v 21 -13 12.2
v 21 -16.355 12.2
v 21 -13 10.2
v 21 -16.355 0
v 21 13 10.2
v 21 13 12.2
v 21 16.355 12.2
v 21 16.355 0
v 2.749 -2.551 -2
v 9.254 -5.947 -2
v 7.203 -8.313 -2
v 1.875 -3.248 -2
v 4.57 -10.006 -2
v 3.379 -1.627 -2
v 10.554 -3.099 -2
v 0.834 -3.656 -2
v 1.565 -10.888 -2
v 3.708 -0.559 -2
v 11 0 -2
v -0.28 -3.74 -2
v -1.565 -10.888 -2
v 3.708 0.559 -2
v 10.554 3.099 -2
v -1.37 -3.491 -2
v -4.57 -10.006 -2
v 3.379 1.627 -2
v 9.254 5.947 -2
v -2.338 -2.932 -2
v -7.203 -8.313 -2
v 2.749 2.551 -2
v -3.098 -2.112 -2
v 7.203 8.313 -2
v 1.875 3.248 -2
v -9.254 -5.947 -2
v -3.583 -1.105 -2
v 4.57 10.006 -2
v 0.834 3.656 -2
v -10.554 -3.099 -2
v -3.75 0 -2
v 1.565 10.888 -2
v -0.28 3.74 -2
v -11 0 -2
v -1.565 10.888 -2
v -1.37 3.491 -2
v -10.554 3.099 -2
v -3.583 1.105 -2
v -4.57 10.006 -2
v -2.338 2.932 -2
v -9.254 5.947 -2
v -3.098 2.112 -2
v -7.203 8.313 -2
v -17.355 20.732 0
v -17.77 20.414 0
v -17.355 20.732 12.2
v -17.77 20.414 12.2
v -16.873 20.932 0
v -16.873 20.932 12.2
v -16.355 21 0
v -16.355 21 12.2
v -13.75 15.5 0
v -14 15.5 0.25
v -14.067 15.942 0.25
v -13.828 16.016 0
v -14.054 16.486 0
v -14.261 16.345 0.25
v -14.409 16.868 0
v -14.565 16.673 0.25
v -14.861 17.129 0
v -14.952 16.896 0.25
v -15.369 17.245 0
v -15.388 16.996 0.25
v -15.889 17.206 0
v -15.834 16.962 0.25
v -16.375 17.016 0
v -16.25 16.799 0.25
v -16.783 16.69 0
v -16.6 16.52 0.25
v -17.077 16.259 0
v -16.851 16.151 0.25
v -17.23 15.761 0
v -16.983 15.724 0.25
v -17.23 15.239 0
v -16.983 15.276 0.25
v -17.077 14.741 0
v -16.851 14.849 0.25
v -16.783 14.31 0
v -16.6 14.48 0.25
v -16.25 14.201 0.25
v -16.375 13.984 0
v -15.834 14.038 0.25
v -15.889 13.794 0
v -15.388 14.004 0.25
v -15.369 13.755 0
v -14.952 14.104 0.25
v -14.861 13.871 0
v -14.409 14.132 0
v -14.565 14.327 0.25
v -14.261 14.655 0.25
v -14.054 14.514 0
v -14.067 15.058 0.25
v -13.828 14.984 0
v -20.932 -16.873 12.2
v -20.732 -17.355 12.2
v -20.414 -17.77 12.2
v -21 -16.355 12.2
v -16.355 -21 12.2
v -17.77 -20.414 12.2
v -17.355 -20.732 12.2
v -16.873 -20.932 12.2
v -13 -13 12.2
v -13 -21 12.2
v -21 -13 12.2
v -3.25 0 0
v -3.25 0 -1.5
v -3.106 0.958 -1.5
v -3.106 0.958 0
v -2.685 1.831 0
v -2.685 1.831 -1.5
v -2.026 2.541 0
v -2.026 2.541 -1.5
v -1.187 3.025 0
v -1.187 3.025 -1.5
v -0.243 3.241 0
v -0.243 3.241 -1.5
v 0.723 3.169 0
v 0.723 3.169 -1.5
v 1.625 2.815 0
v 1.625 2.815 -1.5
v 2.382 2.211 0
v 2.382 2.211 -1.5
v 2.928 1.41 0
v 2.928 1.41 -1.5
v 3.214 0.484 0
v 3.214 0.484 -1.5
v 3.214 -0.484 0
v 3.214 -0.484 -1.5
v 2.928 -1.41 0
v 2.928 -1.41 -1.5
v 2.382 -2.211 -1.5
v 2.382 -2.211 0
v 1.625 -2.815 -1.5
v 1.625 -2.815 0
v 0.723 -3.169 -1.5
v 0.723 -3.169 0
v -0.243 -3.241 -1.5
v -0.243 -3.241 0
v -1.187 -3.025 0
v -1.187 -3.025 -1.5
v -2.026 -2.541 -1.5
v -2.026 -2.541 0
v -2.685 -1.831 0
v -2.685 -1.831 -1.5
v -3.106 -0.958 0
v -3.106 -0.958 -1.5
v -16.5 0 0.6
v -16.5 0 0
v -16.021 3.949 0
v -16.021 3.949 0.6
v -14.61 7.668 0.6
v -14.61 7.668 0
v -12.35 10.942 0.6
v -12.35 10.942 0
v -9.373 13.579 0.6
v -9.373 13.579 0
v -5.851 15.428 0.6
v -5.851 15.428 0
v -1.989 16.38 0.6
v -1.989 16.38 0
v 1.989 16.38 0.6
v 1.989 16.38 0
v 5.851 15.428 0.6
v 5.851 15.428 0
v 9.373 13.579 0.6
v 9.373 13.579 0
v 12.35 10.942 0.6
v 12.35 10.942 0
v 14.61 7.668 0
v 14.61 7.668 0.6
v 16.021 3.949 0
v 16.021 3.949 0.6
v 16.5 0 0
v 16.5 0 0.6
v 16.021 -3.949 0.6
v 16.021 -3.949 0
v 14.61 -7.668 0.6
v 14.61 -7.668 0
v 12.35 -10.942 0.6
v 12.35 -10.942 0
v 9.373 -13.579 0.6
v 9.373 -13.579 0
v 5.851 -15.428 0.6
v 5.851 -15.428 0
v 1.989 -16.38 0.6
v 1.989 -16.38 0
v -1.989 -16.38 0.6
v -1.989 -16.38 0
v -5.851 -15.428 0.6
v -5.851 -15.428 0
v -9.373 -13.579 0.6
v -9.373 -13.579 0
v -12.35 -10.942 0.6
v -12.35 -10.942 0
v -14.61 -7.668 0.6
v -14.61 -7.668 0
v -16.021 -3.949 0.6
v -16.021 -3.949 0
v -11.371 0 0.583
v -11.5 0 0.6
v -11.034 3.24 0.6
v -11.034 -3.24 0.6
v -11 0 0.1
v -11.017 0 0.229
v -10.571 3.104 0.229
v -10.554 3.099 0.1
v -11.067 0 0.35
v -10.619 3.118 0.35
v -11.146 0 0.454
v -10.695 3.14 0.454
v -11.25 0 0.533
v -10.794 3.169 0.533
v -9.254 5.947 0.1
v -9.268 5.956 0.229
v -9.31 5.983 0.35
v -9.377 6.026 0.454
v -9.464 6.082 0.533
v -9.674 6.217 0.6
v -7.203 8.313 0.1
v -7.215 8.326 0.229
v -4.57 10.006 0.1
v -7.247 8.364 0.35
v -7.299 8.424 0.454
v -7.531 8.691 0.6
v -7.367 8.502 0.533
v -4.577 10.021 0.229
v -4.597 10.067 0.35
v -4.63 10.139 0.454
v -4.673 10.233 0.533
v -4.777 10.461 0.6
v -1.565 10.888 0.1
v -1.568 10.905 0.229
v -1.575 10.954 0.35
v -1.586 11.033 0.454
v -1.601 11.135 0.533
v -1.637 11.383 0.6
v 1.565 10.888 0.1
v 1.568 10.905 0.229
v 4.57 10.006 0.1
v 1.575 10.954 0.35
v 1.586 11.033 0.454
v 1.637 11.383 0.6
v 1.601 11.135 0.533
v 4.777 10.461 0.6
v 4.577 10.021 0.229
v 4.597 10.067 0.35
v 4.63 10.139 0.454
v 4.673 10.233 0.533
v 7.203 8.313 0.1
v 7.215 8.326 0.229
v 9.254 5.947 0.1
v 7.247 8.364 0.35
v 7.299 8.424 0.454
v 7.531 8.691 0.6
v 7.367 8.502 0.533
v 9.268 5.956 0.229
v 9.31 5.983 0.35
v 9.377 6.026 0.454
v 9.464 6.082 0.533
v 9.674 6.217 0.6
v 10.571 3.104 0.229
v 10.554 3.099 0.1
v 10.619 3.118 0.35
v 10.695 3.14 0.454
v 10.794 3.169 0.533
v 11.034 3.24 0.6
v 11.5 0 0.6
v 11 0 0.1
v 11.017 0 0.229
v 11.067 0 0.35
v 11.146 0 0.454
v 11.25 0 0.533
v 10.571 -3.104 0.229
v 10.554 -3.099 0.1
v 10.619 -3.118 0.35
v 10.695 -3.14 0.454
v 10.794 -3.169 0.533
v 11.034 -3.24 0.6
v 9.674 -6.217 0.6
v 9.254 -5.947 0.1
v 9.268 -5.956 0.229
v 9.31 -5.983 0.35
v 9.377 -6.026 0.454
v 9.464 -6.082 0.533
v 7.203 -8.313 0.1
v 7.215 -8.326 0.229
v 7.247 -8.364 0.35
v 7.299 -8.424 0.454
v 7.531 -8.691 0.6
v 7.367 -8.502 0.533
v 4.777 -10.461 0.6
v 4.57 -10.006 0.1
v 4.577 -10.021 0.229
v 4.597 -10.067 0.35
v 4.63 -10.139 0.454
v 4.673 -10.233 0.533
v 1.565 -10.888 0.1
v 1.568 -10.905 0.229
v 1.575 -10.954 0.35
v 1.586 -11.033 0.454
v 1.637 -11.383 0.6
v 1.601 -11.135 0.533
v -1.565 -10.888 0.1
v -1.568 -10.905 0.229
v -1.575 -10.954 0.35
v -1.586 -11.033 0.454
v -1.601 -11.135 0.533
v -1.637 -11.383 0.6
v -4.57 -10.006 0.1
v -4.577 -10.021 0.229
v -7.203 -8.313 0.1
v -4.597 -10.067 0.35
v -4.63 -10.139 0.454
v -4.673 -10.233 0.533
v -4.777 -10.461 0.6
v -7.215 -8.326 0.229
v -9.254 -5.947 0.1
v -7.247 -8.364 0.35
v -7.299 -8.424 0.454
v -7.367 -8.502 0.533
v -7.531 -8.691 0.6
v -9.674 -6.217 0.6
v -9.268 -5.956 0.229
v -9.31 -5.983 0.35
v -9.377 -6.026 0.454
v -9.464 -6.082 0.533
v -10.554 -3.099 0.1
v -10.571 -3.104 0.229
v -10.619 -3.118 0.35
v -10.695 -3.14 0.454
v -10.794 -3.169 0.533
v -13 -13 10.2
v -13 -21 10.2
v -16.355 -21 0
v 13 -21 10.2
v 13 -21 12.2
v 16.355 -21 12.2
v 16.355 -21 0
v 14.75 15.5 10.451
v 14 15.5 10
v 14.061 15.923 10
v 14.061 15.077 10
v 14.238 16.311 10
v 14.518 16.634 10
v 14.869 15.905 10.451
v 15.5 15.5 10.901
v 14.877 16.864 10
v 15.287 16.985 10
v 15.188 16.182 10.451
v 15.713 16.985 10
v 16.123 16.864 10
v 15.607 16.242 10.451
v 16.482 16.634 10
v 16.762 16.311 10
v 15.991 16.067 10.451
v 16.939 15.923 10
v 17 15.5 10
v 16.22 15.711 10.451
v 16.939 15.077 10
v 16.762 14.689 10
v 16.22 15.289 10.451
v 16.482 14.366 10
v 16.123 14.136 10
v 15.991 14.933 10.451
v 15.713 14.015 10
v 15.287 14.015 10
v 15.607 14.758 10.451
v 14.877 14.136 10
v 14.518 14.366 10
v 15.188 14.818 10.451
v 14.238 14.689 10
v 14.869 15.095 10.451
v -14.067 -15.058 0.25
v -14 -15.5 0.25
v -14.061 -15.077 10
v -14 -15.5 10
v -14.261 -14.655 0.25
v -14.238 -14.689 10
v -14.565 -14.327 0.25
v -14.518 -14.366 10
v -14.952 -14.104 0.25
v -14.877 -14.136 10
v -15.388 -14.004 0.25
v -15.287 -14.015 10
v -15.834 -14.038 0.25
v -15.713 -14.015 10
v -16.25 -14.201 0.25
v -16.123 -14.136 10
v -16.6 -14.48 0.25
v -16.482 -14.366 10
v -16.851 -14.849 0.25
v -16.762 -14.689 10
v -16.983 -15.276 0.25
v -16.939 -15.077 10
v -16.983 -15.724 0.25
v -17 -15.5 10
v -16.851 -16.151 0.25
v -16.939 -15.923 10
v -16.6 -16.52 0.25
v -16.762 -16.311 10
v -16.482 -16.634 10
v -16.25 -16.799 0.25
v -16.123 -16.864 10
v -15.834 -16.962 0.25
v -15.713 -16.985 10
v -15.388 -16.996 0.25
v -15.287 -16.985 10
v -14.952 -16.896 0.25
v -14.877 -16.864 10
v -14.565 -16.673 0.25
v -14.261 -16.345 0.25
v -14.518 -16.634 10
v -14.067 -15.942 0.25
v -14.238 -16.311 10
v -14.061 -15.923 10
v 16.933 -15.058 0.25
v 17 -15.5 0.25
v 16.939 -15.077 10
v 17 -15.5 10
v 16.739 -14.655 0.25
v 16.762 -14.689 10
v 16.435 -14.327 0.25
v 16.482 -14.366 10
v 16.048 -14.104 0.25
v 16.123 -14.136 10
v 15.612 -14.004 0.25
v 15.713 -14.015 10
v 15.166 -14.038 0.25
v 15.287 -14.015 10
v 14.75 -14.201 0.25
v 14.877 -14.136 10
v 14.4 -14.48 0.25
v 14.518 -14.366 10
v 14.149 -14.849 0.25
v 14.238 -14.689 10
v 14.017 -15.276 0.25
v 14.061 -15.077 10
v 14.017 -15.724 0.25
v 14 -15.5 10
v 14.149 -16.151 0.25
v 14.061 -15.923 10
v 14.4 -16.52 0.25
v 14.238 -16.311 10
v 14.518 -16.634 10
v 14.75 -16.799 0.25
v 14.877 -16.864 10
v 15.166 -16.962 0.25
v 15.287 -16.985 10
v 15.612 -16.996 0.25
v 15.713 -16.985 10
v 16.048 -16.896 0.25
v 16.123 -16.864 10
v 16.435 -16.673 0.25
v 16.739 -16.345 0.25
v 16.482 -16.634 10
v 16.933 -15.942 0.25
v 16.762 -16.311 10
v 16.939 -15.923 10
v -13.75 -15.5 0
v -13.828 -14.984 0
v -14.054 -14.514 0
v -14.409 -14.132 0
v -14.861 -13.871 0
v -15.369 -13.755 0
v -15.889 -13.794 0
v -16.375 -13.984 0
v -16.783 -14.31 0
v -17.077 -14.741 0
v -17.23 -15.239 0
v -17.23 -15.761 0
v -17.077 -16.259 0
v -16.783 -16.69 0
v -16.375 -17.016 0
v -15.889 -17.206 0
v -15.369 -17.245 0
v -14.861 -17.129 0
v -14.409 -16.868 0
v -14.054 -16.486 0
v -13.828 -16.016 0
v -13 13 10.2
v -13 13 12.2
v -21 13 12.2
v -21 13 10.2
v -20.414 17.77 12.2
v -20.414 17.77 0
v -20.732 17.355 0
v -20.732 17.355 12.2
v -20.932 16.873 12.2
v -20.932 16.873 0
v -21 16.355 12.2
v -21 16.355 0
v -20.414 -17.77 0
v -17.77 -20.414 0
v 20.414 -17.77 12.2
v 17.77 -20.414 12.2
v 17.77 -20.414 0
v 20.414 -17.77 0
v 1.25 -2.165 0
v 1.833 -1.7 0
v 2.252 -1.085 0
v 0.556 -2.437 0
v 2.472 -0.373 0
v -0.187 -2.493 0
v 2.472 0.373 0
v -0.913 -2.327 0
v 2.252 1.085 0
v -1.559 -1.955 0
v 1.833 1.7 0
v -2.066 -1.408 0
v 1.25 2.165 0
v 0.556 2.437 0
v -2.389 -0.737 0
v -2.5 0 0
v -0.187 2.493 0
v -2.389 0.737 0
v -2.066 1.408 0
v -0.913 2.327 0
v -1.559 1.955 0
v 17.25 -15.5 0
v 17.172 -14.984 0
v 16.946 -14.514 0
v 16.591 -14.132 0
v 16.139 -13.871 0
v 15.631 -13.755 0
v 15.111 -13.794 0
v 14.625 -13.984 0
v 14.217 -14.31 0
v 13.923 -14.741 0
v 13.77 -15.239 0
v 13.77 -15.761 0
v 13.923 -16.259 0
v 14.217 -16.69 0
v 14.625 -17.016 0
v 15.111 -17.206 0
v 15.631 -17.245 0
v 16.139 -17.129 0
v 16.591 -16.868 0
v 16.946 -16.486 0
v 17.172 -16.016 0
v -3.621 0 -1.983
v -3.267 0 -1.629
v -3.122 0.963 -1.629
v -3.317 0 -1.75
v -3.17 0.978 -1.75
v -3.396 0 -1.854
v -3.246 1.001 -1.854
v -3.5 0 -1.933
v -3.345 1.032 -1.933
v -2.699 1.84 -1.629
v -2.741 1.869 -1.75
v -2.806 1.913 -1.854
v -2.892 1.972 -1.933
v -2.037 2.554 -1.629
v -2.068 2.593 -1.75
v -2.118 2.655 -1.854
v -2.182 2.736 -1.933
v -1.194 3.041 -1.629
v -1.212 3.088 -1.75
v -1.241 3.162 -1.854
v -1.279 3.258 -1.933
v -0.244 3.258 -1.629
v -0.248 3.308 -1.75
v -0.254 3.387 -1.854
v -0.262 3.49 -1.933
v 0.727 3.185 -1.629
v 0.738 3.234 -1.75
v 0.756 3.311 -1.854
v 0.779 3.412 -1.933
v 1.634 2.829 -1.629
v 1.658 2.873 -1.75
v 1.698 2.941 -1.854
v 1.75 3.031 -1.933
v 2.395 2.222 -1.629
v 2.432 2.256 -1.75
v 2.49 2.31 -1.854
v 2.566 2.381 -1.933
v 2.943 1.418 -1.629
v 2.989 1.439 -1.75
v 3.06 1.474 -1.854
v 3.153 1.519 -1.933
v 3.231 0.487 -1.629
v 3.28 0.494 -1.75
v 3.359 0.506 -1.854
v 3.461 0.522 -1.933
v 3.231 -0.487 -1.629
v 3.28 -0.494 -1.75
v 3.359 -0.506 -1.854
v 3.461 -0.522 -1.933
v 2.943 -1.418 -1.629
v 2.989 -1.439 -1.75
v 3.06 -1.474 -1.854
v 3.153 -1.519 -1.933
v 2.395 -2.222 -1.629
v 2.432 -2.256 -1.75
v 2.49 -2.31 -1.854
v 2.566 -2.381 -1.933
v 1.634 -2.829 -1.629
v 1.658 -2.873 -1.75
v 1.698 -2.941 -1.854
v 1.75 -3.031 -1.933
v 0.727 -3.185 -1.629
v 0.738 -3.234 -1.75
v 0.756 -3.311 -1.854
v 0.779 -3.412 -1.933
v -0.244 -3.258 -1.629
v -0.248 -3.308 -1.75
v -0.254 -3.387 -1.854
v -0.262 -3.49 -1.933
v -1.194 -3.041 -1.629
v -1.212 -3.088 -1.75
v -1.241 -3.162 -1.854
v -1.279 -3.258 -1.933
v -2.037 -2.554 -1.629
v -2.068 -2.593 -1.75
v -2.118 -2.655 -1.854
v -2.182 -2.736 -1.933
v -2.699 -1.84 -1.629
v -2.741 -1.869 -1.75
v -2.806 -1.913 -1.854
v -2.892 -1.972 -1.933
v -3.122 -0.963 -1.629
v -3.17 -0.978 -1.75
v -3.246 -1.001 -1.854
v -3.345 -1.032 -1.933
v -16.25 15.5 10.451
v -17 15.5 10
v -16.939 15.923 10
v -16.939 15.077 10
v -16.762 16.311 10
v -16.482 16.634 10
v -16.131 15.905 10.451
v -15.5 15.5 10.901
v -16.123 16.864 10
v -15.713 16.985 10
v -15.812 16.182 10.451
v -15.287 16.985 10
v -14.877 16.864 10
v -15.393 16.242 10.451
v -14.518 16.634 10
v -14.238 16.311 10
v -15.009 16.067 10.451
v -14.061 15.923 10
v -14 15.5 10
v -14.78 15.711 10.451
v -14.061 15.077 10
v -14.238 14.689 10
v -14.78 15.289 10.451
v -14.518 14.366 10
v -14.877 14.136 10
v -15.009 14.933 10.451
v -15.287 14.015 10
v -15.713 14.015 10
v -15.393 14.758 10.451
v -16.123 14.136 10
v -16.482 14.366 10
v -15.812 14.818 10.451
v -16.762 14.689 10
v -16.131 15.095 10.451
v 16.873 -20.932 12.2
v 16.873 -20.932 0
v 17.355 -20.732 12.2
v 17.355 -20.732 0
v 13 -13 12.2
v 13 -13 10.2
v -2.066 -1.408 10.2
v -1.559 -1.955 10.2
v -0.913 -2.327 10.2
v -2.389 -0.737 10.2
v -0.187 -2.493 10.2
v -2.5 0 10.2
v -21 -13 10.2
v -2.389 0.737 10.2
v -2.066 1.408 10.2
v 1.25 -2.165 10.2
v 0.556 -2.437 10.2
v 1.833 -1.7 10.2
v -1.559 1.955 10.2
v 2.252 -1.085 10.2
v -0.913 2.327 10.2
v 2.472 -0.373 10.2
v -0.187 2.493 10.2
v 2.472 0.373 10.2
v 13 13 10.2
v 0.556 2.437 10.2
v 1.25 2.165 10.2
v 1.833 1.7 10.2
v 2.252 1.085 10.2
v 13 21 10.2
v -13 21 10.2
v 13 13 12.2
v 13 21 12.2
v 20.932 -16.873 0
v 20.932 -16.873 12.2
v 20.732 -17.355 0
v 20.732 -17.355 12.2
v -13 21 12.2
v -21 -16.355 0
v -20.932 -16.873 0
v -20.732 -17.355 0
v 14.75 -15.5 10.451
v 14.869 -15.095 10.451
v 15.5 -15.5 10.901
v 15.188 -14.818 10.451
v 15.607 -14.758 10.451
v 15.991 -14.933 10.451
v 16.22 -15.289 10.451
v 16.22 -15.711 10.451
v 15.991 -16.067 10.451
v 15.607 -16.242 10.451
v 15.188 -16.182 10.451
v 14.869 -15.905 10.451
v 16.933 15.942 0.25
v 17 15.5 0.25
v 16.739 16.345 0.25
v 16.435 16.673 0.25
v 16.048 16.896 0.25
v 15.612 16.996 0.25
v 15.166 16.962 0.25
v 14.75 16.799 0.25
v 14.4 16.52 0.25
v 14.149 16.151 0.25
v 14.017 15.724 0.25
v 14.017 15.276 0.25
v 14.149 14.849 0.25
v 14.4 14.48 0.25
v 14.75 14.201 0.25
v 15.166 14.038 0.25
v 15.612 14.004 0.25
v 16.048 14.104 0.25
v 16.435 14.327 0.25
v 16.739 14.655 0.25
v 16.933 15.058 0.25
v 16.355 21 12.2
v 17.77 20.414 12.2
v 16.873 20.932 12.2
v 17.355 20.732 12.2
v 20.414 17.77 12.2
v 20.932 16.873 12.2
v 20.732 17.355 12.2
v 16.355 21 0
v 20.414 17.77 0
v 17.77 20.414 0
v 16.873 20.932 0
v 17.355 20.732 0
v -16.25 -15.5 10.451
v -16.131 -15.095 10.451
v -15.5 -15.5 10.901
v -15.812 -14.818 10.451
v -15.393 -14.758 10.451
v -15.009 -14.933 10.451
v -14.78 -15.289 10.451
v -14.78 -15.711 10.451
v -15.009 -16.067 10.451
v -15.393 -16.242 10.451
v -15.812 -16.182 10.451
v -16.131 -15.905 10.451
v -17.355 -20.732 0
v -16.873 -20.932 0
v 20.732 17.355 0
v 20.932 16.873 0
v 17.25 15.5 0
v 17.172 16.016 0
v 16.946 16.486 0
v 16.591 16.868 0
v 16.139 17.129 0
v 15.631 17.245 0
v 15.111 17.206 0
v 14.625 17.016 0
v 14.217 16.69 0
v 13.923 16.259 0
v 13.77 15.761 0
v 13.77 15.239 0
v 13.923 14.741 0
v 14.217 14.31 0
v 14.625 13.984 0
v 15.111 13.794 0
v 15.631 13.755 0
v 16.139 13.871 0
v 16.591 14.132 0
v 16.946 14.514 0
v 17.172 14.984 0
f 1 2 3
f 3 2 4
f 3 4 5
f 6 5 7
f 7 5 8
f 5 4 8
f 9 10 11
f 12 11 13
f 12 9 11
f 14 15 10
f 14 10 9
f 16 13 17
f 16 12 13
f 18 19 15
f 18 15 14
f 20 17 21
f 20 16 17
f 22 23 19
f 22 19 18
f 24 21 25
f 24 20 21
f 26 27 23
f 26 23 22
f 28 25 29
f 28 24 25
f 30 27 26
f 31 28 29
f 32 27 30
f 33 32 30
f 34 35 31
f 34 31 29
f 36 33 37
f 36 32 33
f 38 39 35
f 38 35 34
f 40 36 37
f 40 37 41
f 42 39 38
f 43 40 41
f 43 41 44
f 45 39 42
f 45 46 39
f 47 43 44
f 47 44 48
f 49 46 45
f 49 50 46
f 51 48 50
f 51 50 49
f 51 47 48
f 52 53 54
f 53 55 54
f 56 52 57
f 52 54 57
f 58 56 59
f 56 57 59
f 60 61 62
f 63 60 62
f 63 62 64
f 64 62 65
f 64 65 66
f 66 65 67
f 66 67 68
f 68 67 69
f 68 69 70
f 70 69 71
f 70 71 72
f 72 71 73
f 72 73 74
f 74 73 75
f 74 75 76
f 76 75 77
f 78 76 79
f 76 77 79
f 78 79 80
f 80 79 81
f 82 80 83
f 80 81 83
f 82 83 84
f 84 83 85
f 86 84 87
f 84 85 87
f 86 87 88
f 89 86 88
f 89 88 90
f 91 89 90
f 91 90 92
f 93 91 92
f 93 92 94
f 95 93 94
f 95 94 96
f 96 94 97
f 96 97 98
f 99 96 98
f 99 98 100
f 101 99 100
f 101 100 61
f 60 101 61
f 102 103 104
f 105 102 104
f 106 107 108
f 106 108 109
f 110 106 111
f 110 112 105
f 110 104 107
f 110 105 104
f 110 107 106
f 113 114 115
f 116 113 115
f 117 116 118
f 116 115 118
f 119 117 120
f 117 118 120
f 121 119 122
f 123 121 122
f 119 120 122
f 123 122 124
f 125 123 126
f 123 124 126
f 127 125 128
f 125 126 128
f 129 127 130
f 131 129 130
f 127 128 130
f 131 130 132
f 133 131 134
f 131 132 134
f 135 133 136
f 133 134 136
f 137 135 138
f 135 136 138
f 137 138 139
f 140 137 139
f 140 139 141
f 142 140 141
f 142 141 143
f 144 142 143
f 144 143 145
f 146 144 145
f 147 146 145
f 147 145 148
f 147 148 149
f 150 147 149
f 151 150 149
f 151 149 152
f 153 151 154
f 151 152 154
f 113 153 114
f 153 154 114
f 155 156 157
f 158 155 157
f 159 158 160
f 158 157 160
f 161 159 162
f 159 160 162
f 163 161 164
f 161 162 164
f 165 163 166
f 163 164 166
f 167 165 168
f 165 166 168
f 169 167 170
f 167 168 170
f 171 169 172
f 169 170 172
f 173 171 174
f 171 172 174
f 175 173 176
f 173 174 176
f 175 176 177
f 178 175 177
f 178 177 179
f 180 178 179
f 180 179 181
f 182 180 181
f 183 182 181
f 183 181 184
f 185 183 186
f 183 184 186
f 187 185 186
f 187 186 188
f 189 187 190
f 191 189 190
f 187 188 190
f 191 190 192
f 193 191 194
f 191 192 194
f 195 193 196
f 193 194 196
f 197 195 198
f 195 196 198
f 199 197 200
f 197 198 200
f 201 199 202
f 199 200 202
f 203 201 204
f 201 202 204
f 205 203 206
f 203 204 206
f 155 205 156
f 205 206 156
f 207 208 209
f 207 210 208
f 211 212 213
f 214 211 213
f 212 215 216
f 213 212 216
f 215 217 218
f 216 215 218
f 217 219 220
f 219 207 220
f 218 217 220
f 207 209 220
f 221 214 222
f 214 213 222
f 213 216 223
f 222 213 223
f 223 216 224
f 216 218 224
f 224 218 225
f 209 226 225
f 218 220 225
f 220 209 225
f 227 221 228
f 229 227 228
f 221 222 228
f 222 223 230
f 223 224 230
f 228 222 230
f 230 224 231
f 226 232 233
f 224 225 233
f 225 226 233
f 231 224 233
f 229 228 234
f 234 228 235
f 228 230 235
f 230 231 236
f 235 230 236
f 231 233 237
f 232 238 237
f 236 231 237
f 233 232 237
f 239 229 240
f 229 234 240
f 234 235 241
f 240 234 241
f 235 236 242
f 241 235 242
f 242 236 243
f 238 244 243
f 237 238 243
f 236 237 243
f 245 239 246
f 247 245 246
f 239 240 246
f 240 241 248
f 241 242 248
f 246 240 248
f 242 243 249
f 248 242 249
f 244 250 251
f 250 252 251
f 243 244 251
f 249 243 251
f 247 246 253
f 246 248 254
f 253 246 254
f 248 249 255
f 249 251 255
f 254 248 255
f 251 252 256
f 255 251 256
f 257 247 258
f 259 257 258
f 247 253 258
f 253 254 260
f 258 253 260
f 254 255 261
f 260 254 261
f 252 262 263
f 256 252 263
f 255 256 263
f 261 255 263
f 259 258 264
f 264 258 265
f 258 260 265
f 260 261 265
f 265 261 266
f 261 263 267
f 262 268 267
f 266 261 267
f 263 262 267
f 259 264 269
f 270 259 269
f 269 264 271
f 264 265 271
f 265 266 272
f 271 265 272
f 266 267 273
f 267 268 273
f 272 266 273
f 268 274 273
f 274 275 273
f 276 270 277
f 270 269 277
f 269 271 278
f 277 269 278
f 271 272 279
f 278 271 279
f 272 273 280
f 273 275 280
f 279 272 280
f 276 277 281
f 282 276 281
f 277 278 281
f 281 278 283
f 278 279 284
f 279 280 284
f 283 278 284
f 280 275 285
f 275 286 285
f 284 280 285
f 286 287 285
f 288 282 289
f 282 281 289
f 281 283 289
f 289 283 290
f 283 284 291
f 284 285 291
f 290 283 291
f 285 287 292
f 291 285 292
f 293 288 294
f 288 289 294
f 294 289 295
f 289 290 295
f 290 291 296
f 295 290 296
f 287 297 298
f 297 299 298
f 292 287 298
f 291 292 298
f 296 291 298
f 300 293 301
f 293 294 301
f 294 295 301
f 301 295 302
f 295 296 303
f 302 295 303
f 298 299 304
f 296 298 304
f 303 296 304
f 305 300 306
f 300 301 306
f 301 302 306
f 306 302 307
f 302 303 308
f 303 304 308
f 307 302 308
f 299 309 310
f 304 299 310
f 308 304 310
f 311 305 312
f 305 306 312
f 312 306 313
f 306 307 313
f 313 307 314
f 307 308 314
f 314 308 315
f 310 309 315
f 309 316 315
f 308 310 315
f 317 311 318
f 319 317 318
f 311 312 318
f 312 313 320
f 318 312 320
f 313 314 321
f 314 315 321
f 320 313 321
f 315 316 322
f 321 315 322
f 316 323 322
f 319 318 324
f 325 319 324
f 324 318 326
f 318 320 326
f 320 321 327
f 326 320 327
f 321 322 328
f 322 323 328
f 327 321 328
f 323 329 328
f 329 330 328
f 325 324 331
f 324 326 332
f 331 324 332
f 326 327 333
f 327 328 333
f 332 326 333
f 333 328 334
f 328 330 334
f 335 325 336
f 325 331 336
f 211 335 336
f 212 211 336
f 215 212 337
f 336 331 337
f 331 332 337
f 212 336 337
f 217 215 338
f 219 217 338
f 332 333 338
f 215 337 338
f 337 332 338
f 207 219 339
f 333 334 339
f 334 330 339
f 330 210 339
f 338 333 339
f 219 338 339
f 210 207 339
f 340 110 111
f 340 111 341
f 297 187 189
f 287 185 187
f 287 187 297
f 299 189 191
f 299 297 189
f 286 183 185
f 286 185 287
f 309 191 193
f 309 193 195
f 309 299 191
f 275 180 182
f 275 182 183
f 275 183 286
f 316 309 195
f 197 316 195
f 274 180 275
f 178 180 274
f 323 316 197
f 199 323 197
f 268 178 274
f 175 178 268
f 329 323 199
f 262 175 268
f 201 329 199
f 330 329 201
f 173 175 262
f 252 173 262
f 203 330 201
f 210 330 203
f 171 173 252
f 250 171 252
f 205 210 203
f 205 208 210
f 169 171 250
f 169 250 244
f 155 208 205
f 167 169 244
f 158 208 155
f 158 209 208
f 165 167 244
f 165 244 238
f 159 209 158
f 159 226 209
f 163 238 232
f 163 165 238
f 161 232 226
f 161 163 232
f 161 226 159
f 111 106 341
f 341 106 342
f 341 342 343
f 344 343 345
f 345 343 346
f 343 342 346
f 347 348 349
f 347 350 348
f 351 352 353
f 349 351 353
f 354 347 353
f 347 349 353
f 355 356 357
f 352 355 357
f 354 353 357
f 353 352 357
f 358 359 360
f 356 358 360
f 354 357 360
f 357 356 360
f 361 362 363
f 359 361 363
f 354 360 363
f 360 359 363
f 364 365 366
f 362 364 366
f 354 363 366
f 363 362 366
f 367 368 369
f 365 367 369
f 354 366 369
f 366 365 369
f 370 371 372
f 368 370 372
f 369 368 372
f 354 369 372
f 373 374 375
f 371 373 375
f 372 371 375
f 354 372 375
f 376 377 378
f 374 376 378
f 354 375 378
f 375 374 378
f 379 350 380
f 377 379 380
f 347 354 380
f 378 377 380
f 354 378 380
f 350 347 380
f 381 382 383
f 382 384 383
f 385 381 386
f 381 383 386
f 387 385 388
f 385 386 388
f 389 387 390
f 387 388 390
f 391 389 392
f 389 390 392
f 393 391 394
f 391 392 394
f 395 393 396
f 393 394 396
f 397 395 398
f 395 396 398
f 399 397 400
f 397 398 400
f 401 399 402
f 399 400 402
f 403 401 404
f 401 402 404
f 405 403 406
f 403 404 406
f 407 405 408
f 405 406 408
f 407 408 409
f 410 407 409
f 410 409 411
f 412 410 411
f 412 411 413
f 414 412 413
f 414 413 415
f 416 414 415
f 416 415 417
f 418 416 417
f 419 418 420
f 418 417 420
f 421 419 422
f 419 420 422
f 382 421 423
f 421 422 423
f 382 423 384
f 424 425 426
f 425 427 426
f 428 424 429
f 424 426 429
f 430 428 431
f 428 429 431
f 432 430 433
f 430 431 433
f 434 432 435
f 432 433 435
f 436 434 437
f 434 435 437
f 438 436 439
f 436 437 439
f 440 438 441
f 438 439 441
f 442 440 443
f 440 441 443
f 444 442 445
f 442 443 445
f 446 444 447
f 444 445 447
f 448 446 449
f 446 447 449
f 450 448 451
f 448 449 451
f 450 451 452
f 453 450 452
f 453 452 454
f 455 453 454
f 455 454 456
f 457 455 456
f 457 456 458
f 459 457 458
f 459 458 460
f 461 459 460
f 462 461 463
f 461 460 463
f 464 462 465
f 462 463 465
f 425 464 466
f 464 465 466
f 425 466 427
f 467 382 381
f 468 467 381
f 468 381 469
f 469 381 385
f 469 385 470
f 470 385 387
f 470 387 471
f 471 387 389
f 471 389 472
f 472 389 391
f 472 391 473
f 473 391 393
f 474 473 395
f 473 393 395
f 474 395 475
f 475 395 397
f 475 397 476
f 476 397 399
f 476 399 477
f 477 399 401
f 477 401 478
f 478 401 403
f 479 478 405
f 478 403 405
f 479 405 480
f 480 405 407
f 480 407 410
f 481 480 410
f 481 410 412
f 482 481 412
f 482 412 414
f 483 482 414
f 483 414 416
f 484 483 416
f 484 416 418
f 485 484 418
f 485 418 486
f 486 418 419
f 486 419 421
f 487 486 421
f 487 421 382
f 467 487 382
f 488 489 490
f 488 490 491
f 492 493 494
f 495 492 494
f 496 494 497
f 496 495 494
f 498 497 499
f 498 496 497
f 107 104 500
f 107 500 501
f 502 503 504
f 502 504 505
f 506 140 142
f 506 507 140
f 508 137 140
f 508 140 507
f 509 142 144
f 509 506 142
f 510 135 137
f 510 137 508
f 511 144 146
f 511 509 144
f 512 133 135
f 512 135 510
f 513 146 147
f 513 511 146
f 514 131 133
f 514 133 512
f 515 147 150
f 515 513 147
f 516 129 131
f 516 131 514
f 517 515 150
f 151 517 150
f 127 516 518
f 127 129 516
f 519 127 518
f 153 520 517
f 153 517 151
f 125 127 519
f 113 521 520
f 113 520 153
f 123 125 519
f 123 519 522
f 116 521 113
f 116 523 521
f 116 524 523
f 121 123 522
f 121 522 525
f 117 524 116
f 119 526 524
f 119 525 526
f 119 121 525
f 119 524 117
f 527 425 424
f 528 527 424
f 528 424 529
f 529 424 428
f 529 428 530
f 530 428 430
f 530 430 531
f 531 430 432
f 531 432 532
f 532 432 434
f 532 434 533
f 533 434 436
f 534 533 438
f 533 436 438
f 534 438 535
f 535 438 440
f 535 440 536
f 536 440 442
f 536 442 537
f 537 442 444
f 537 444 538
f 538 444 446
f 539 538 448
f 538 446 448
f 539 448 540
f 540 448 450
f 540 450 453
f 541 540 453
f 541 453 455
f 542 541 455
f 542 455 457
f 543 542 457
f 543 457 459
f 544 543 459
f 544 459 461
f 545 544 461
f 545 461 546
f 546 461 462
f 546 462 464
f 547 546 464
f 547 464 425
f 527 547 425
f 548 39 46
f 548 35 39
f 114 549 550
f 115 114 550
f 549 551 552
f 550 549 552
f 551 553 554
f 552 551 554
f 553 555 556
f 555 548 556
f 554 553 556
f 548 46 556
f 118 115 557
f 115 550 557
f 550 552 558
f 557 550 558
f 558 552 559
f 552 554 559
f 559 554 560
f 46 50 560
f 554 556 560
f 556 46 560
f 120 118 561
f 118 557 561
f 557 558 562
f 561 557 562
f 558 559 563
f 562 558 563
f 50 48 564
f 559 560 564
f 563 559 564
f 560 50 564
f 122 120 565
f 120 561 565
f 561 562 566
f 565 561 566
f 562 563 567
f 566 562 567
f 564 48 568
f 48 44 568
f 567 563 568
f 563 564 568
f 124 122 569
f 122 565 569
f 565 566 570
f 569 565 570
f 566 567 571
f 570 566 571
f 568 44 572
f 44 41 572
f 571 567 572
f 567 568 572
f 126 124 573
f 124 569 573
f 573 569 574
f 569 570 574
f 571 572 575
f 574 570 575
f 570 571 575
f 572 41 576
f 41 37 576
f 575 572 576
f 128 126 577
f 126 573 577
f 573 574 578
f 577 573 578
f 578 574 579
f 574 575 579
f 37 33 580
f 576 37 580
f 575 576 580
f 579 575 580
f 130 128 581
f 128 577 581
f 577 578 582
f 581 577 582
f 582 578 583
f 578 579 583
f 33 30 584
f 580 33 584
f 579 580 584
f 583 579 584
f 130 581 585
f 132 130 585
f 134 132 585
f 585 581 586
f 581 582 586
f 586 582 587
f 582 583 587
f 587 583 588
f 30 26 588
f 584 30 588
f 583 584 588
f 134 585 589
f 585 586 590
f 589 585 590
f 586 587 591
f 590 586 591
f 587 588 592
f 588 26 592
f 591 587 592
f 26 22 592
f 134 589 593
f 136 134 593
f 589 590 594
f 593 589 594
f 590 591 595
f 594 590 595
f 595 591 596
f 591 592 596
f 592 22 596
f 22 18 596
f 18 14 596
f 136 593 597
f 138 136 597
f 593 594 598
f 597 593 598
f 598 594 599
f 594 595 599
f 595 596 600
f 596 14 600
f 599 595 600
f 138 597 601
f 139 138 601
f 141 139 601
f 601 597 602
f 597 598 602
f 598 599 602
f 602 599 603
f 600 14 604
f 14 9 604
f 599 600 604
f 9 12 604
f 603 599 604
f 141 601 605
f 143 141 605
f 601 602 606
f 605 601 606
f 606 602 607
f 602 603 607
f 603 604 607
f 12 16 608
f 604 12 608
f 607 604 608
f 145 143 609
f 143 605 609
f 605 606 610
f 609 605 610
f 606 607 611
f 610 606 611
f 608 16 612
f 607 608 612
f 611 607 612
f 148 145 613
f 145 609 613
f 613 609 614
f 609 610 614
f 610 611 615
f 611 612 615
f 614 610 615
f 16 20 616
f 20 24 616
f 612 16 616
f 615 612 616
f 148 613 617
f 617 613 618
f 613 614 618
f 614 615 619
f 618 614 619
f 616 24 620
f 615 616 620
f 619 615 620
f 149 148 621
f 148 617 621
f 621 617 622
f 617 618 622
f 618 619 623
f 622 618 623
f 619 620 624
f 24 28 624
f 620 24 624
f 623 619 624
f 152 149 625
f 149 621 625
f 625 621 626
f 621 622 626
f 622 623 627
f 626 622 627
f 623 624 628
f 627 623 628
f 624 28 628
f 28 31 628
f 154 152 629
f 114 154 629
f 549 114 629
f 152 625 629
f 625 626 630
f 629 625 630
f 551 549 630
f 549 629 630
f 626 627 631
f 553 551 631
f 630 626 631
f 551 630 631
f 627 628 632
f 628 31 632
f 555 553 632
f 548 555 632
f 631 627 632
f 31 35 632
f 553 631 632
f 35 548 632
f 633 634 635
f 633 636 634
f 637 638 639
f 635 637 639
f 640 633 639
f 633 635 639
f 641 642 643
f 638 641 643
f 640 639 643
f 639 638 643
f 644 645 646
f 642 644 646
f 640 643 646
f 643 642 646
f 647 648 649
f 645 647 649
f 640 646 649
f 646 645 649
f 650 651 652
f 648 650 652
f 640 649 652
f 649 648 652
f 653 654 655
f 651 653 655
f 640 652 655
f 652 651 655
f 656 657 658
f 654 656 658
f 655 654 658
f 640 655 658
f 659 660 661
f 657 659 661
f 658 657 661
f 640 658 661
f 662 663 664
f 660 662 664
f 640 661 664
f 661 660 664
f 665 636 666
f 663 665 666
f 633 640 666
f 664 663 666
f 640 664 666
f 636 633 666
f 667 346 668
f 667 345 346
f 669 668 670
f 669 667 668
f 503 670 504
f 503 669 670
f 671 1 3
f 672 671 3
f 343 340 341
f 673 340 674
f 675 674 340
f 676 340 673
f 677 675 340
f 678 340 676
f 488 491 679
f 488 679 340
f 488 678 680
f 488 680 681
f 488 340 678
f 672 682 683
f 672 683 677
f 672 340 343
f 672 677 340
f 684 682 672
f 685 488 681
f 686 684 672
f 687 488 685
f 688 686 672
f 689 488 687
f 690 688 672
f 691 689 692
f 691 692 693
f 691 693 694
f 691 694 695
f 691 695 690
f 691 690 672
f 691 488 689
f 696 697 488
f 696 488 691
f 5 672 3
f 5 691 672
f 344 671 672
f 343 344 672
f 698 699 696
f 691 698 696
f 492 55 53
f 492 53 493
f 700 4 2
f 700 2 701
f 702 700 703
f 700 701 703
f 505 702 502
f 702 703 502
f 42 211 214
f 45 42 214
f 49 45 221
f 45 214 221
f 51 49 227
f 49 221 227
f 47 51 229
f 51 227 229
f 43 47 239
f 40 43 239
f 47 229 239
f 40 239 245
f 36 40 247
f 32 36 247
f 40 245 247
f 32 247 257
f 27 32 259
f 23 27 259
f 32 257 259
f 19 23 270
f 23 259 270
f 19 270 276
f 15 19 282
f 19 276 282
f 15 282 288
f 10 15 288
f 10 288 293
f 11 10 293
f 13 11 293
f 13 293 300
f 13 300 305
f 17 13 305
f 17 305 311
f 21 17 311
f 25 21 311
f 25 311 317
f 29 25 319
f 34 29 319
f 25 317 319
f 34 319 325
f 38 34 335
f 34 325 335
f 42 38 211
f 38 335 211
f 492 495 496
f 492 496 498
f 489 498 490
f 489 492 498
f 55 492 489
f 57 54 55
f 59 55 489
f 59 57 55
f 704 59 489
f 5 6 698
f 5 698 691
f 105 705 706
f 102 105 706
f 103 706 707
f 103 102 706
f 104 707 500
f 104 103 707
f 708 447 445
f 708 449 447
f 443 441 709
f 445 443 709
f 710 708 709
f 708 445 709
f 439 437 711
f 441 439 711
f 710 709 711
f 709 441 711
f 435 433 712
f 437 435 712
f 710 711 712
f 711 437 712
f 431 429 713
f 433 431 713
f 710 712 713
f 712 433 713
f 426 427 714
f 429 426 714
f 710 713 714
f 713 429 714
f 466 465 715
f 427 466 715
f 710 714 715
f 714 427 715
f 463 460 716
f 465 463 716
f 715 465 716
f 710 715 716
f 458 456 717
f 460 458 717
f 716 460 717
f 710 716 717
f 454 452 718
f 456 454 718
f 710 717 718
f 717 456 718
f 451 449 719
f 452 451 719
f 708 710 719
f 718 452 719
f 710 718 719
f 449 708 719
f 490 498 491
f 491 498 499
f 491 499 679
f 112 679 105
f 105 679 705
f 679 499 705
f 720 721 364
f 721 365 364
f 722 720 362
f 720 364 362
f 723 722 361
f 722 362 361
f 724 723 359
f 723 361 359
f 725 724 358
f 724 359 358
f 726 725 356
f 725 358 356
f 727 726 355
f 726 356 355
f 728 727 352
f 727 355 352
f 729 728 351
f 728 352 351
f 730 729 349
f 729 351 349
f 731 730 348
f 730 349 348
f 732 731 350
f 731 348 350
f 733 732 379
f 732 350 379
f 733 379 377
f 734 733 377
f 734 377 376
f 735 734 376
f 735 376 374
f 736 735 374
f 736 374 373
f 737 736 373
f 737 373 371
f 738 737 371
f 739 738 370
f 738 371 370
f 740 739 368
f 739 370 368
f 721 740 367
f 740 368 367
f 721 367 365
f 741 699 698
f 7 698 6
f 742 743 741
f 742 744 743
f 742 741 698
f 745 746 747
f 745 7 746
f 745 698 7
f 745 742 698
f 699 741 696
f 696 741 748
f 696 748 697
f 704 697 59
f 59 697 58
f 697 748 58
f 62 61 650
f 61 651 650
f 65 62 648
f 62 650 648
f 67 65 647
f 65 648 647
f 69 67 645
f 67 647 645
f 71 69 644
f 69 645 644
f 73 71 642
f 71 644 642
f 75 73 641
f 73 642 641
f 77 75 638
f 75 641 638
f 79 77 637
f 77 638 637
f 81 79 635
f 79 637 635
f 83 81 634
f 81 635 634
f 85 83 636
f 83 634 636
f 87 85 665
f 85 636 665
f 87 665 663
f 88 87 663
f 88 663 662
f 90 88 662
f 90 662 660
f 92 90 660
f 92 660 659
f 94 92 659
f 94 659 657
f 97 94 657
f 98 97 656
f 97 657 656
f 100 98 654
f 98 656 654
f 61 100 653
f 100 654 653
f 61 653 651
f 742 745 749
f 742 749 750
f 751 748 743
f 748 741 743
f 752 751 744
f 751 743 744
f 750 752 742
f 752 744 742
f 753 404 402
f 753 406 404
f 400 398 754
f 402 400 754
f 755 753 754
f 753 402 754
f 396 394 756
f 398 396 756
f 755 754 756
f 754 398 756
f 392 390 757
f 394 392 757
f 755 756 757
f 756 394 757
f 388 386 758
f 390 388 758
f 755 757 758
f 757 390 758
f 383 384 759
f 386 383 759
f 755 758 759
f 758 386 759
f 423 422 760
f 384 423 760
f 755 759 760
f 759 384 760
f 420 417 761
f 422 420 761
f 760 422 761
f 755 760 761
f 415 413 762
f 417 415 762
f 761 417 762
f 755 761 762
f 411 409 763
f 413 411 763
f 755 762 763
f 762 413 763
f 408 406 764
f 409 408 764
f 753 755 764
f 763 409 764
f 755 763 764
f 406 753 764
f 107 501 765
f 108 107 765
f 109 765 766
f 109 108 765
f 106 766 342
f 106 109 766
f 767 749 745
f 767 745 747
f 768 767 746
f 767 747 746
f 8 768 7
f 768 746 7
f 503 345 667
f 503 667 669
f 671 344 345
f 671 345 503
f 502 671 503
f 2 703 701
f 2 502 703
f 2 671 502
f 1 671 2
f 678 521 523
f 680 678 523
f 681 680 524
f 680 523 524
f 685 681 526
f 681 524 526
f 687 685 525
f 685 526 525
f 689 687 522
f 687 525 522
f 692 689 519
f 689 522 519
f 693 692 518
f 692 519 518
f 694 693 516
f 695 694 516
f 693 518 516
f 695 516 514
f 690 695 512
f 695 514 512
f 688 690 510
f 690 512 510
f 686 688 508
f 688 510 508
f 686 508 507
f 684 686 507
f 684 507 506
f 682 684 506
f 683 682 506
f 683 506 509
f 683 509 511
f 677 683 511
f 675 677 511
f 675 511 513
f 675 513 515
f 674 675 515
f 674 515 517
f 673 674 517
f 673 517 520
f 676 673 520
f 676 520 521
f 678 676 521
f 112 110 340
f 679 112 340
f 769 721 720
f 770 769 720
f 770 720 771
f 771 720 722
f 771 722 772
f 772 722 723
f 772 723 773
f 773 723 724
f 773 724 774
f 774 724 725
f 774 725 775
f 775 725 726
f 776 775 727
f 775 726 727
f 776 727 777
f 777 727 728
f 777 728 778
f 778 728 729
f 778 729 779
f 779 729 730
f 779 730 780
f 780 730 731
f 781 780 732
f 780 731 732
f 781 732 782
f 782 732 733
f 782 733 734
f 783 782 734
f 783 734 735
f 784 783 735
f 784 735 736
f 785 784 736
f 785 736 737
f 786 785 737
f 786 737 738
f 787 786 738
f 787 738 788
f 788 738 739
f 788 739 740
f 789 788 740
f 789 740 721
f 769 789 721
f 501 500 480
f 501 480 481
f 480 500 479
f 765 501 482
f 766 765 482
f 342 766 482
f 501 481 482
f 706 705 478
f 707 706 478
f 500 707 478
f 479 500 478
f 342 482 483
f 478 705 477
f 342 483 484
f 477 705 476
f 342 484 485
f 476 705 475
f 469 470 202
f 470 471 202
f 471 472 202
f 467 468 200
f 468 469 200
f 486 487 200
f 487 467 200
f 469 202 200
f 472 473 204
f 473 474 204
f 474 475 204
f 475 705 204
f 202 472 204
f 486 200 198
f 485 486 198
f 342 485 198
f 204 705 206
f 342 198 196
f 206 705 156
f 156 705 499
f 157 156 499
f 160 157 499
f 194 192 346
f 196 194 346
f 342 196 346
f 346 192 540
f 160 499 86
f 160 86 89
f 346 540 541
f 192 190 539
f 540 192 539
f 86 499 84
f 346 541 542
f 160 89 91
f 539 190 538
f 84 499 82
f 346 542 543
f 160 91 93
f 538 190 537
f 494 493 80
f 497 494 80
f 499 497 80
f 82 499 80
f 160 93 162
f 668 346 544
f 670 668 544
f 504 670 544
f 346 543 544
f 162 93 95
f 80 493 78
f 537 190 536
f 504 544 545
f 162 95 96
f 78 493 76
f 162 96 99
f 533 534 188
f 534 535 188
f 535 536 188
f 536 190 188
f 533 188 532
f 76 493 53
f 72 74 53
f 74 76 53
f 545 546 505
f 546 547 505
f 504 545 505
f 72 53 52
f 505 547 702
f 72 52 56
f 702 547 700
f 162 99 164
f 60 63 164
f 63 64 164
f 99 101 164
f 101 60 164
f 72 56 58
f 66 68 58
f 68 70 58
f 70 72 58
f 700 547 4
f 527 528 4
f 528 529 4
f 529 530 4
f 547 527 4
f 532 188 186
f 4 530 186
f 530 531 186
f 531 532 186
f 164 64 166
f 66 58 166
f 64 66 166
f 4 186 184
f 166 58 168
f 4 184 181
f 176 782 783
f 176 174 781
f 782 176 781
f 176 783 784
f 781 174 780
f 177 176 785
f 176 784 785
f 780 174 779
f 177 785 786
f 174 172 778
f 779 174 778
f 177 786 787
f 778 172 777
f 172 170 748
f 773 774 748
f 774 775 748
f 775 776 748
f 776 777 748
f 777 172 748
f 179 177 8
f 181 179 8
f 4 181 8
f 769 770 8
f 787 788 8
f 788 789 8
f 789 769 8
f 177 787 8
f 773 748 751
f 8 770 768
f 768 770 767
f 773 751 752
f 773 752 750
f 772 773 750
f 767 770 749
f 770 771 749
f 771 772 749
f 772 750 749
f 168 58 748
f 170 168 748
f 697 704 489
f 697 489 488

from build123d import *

# Parameters (mm, degrees)
BOSS_EXTRUDE1_DEPTH             = 12.2
SKETCH2_W                       = 2
SKETCH2_H                       = 26
CUT_EXTRUDE1_DEPTH              = 43
SKETCH3_W                       = 26
SKETCH3_H                       = 2
CUT_EXTRUDE2_DEPTH              = 43
SKETCH4_R                       = 16.5
CUT_EXTRUDE3_DEPTH              = 0.6
SKETCH5_R                       = 11
BOSS_EXTRUDE2_DEPTH             = 2.6
SKETCH6_R                       = 3.25
CUT_EXTRUDE4_DEPTH              = 2
SKETCH7_R                       = 2.5
CUT_EXTRUDE5_DEPTH              = 13.2
FILLET1_R                       = 0.5
FILLET3_R                       = 0.5
FILLET4_R                       = 2
M3X0_5_TAPPED_HOLE1_D           = 3
M3X0_5_TAPPED_HOLE1_DEPTH       = 10
M3X0_5_TAPPED_HOLE1_CSINK_D     = 3.5
M3X0_5_TAPPED_HOLE1_CSINK_ANGLE = 90
M3X0_5_TAPPED_HOLE1_TIP         = 0.901290929


with BuildPart() as part:
    # Sketch1 → Boss-Extrude1 (new body)
    with BuildSketch(Plane.XY):
        Polygon((-17.183766184, 21), (-21, 17.183766184), (-21, -17.183766184), (-17.183766184, -21), (17.183766184, -21), (21, -17.183766184), (21, 17.183766184), (17.183766184, 21), align=None)
    extrude(amount=BOSS_EXTRUDE1_DEPTH)

    # Sketch2 → Cut-Extrude1 (cut, through all)
    with BuildSketch(Plane(origin=(21, 0, 0), x_dir=(0, 0, -1), z_dir=(1, 0, 0))):
        with Locations((-11.2, 0)):
            Rectangle(SKETCH2_W, SKETCH2_H)
    extrude(amount=-CUT_EXTRUDE1_DEPTH, mode=Mode.SUBTRACT)

    # Sketch3 → Cut-Extrude2 (cut, through all)
    with BuildSketch(Plane(origin=(0, 21, 0), x_dir=(1, 0, 0), z_dir=(0, 1, 0))):
        with Locations((0, -11.2)):
            Rectangle(SKETCH3_W, SKETCH3_H)
    extrude(amount=-CUT_EXTRUDE2_DEPTH, mode=Mode.SUBTRACT)

    # Sketch4 → Cut-Extrude3 (cut)
    with BuildSketch(Plane(origin=(0, 0, 0), x_dir=(-1, 0, 0), z_dir=(0, 0, -1))):
        Circle(SKETCH4_R)
    extrude(amount=-CUT_EXTRUDE3_DEPTH, mode=Mode.SUBTRACT)

    # Sketch5 → Boss-Extrude2 (add)
    with BuildSketch(Plane(origin=(0, 0, 0.6), x_dir=(-1, 0, 0), z_dir=(0, 0, -1))):
        Circle(SKETCH5_R)
    extrude(amount=BOSS_EXTRUDE2_DEPTH)

    # Sketch6 → Cut-Extrude4 (cut)
    with BuildSketch(Plane(origin=(0, 0, -2), x_dir=(-1, 0, 0), z_dir=(0, 0, -1))):
        Circle(SKETCH6_R)
    extrude(amount=-CUT_EXTRUDE4_DEPTH, mode=Mode.SUBTRACT)

    # Sketch7 → Cut-Extrude5 (cut, through all)
    with BuildSketch(Plane(origin=(0, 0, 0), x_dir=(-1, 0, 0), z_dir=(0, 0, -1))):
        Circle(SKETCH7_R)
    extrude(amount=-CUT_EXTRUDE5_DEPTH, mode=Mode.SUBTRACT)

    # Fillet1
    fillet1_edges = [part.edges().sort_by_distance(p)[0] for p in [
        (3.25, 0, -2),
    ]]
    fillet(fillet1_edges, radius=FILLET1_R)

    # Fillet3
    fillet3_edges = [part.edges().sort_by_distance(p)[0] for p in [
        (11, 0, 0.6),
    ]]
    fillet(fillet3_edges, radius=FILLET3_R)

    # Fillet4
    fillet4_edges = [part.edges().sort_by_distance(p)[0] for p in [
        (17.183766184, 21, 6.1),
        (21, 17.183766184, 6.1),
        (21, -17.183766184, 6.1),
        (17.183766184, -21, 6.1),
        (-17.183766184, -21, 6.1),
        (-21, -17.183766184, 6.1),
        (-21, 17.183766184, 6.1),
        (-17.183766184, 21, 6.1),
    ]]
    fillet(fillet4_edges, radius=FILLET4_R)

    # M3x0.5 Tapped Hole1
    with Locations(Plane(origin=(0, 0, 0), x_dir=(-1, 0, 0), z_dir=(0, 0, -1))):
        with Locations((-15.5, -15.5), (-15.5, 15.5), (15.5, 15.5), (15.5, -15.5)):
            CounterSinkHole(M3X0_5_TAPPED_HOLE1_D / 2, M3X0_5_TAPPED_HOLE1_CSINK_D / 2, depth=M3X0_5_TAPPED_HOLE1_DEPTH, counter_sink_angle=M3X0_5_TAPPED_HOLE1_CSINK_ANGLE)
            with Locations((0, 0, -(M3X0_5_TAPPED_HOLE1_DEPTH + M3X0_5_TAPPED_HOLE1_TIP / 2))):  # 118° drill point
                Cone(0, M3X0_5_TAPPED_HOLE1_D / 2, M3X0_5_TAPPED_HOLE1_TIP, mode=Mode.SUBTRACT)


solid = part.part
